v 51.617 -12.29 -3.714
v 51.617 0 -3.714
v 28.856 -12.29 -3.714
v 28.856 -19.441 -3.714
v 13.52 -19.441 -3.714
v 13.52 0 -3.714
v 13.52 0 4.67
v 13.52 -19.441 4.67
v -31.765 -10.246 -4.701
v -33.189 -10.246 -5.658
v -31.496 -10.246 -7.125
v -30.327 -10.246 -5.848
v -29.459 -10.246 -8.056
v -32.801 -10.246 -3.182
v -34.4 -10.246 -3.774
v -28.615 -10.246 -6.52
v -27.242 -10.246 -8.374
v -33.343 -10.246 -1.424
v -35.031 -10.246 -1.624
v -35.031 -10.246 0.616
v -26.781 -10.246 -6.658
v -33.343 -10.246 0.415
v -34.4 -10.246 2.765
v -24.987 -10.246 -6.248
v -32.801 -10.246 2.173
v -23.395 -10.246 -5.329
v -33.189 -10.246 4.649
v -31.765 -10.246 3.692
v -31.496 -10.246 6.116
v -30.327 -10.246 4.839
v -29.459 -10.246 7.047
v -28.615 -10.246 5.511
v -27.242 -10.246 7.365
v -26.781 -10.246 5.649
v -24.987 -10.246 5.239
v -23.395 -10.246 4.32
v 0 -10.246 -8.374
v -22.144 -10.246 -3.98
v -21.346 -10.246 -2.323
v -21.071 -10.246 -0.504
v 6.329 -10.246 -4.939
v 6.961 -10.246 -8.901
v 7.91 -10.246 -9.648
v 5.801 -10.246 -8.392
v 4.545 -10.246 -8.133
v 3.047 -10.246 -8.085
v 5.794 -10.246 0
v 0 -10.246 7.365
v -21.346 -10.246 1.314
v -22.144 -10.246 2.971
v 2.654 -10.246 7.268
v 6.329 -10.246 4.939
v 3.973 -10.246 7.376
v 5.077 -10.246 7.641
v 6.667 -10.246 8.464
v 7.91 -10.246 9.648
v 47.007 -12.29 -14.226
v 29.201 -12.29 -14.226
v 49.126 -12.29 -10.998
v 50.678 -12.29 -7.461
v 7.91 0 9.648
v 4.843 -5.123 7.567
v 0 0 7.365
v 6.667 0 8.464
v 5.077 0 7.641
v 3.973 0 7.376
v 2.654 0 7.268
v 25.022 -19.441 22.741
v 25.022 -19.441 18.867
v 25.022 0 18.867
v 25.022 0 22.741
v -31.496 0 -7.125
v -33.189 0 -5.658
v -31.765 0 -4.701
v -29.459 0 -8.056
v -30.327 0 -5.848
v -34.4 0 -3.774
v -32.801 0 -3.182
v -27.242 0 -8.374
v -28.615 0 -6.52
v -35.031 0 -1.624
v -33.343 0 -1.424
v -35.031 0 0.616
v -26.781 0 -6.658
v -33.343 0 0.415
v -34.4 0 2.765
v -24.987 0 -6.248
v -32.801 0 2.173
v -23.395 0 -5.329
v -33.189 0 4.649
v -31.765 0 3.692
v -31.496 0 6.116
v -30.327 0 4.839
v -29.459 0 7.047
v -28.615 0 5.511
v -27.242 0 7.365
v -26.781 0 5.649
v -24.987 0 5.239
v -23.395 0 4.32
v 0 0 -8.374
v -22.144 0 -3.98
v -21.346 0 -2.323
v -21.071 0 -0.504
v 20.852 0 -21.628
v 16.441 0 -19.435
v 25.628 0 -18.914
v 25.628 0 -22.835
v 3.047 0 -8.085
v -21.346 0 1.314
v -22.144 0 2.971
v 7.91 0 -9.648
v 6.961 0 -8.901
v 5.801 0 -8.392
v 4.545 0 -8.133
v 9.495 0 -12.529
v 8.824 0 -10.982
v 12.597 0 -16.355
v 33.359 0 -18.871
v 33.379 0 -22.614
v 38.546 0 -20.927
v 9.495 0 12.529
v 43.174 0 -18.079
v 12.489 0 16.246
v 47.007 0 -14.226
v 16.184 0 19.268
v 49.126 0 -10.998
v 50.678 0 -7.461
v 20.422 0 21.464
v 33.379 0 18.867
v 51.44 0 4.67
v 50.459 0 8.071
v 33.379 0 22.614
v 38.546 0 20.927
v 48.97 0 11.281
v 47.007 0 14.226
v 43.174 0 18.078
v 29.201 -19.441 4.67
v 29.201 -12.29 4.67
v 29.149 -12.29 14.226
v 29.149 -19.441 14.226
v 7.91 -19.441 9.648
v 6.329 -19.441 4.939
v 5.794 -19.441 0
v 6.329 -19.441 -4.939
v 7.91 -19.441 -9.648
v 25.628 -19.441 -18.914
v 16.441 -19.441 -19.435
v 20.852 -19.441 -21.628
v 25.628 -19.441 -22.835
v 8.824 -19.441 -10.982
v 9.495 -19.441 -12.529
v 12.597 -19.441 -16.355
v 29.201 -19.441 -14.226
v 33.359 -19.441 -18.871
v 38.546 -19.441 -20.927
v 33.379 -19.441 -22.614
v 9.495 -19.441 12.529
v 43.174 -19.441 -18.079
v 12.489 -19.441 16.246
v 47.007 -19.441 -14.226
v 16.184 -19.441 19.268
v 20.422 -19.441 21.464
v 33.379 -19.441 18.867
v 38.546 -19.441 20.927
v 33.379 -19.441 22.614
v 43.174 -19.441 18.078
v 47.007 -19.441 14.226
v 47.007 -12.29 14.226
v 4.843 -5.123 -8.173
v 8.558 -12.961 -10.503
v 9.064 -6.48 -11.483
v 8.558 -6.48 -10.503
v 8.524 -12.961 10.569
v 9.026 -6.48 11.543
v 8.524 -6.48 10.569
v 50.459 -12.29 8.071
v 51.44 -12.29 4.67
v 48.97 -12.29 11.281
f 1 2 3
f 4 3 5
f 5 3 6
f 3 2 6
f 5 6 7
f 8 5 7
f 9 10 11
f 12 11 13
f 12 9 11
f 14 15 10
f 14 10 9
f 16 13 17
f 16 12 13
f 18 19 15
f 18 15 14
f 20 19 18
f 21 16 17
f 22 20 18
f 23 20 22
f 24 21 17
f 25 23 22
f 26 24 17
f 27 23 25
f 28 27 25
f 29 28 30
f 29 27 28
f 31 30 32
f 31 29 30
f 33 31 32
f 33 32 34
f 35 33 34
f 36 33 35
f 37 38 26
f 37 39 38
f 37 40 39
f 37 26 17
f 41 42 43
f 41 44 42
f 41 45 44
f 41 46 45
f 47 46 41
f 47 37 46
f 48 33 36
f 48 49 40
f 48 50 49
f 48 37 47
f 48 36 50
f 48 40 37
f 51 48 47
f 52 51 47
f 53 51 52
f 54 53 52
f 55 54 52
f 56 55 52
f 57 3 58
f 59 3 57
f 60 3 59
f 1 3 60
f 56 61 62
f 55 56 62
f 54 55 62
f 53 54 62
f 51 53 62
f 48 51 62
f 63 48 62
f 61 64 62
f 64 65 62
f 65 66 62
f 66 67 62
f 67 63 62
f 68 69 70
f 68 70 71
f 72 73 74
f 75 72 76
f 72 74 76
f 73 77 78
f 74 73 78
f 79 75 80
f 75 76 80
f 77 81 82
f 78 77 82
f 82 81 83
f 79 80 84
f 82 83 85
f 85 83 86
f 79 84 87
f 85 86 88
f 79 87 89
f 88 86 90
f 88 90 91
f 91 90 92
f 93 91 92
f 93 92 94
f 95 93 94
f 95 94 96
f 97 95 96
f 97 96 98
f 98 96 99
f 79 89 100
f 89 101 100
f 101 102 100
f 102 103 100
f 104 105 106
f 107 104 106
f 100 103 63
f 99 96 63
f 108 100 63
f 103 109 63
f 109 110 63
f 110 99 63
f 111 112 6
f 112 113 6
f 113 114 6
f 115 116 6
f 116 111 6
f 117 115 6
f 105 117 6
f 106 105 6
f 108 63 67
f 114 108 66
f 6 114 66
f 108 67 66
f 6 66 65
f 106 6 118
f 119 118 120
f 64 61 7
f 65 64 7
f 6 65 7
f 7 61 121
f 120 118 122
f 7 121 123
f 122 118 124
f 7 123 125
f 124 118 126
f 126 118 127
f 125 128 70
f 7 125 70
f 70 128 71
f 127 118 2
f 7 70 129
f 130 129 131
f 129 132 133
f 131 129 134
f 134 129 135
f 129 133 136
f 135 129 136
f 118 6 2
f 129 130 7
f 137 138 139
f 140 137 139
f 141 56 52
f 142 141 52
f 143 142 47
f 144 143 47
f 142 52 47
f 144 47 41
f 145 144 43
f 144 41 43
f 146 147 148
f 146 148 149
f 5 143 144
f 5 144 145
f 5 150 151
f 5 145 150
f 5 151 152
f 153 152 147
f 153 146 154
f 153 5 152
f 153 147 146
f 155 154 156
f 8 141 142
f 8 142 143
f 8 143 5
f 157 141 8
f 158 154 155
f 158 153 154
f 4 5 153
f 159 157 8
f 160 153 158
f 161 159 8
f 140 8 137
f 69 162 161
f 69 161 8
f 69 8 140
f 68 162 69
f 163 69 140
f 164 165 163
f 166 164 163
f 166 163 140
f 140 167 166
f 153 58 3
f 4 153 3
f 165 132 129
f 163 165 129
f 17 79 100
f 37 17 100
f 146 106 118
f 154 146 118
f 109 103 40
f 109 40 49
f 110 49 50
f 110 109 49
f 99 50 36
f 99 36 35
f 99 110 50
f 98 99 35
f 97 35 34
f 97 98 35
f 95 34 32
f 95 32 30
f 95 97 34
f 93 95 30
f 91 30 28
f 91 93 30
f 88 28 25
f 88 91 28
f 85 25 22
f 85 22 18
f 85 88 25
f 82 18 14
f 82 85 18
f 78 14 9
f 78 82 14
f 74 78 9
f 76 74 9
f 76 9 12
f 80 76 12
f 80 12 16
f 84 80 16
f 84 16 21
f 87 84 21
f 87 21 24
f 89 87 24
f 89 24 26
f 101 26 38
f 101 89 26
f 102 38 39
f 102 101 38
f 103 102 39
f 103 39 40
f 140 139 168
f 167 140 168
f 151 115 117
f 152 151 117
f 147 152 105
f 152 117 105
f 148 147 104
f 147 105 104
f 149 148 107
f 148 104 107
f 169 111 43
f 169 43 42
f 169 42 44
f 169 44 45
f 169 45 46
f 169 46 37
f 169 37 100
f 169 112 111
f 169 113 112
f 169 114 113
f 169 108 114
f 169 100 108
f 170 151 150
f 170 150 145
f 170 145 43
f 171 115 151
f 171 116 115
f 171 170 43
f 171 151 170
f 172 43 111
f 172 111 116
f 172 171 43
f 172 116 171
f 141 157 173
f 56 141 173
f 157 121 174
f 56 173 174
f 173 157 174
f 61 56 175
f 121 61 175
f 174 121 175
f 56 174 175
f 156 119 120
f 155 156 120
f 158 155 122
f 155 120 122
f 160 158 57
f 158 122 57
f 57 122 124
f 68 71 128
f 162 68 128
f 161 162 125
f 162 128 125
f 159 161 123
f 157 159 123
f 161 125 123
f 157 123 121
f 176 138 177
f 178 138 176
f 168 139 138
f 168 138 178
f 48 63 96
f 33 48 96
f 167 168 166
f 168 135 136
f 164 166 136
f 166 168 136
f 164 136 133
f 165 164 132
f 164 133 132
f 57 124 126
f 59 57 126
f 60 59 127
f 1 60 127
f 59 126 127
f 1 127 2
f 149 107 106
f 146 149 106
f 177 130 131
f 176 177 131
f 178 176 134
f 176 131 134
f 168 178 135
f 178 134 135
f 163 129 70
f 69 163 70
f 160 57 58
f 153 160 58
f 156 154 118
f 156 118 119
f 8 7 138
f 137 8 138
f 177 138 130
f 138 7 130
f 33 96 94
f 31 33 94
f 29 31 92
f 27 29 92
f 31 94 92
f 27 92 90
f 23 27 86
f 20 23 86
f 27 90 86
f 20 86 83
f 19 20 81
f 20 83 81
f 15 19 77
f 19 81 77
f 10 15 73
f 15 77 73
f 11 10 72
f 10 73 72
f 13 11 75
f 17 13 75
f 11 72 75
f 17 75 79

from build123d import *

# Parameters (mm, degrees)
F0_R     = 6.1702881354
F1_DEPTH = 10.24551
F2_DEPTH = 19.44125
F3_DEPTH = 12.29025


# Not quite as in the source:
# - the program builds the solid bodies; features that only make, move or delete a surface that nothing else refers to are left out


with BuildPart() as f1:
    # F0 (on Front) → F1 (new body)
    with BuildSketch(Plane.XZ):
        with BuildLine():
            ThreePointArc((7.9096967883, -9.6482263274), (5.7944386046, 0), (7.9096967883, 9.6482263274))
            add(Edge.make_bspline(
                [(7.9096967883, 9.6482263274), (7.1691805882, 8.7133229845), (4.8849042306, 7.0496072248), (1.7047020698, 7.2518519174), (0, 7.3653594591)],
                knots=[0.305255717, 0.305255717, 0.305255717, 0.305255717, 0.6293542053, 1, 1, 1, 1], degree=3))
            Line((0, 7.3653594591), (-27.2417403758, 7.3653594591))
            ThreePointArc((-27.2417403758, 7.3653594591), (-35.1115765516, -0.5044767167), (-27.2417403758, -8.3743128926))
            Line((-27.2417403758, -8.3743128926), (0, -8.3743128926))
            add(Edge.make_bspline(
                [(7.9096967883, -9.6482263274), (7.1553998901, -8.8616436412), (4.7881379326, -7.7629787373), (1.6803783566, -8.1685536627), (0, -8.3743128926)],
                knots=[0.3094407552, 0.3094407552, 0.3094407552, 0.3094407552, 0.6242726729, 1, 1, 1, 1], degree=3))
        make_face()
        with Locations((-27.2417403758, -0.5044767167)):
            Circle(F0_R, mode=Mode.SUBTRACT)
    extrude(amount=F1_DEPTH)

    # F0 (on Front) → F2 (join)
    with BuildSketch(Plane.XZ):
        with BuildLine():
            Line((29.1485549066, 14.2256355643), (47.0073711523, 14.2256355643))
            ThreePointArc((47.0073711523, 14.2256355643), (40.9442597431, 19.6396071394), (33.3793842605, 22.6136728933))
            Line((33.3793842605, 22.6136728933), (33.3793842605, 18.8674259181))
            Line((33.3793842605, 18.8674259181), (25.0220429152, 18.8674259181))
            Line((25.0220429152, 18.8674259181), (25.0220429152, 22.7406880158))
            ThreePointArc((25.0220429152, 22.7406880158), (16.1840833933, 19.2680953065), (9.494543791, 12.5287712643))
            add(Edge.make_bspline(
                [(9.494543791, 12.5287712643), (9.0162268309, 11.5501776901), (8.6071600956, 10.5287752978), (7.9096967883, 9.6482263274)],
                knots=[0, 0, 0, 0, 0.305255717, 0.305255717, 0.305255717, 0.305255717], degree=3))
            ThreePointArc((7.9096967883, 9.6482263274), (5.7944386046, 0), (7.9096967883, -9.6482263274))
            add(Edge.make_bspline(
                [(9.494543791, -12.5287712643), (9.0785331078, -11.4704442228), (8.6510771527, -10.4213396199), (7.9096967883, -9.6482263274)],
                knots=[0, 0, 0, 0, 0.3094407552, 0.3094407552, 0.3094407552, 0.3094407552], degree=3))
            ThreePointArc((9.494543791, -12.5287712643), (16.441223865, -19.434771268), (25.6276700044, -22.8345370586))
            Line((25.6276700044, -22.8345370586), (25.6276700044, -18.9136881421))
            Line((25.6276700044, -18.9136881421), (33.3589574797, -18.8714867898))
            Line((33.3589574797, -18.8714867898), (33.3793842605, -22.6136728933))
            ThreePointArc((33.3793842605, -22.6136728933), (40.9439316742, -19.6398090623), (47.0068958817, -14.2262419686))
            Line((47.0068958817, -14.2262419686), (29.2007135878, -14.2262419686))
            Line((29.2007135878, -14.2262419686), (28.8560651243, -3.7142947274))
            Line((28.8560651243, -3.7142947274), (13.5199762881, -3.7142947274))
            Line((13.5199762881, -3.7142947274), (13.5199762881, 4.6701654948))
            Line((13.5199762881, 4.6701654948), (29.2007135878, 4.6701654948))
            Line((29.2007135878, 4.6701654948), (29.1485549066, 14.2256355643))
        make_face()
    extrude(amount=F2_DEPTH)

    # F0 (on Front) → F3 (join)
    with BuildSketch(Plane.XZ):
        with BuildLine():
            ThreePointArc((47.0068958817, -14.2262419686), (49.9762101479, -9.2616462852), (51.6166150388, -3.7142947274))
            Line((51.6166150388, -3.7142947274), (28.8560651243, -3.7142947274))
            Line((28.8560651243, -3.7142947274), (29.2007135878, -14.2262419686))
            Line((29.2007135878, -14.2262419686), (47.0068958817, -14.2262419686))
        make_face()
        with BuildLine():
            Line((29.2007135878, 4.6701654948), (51.4398684351, 4.6701654948))
            ThreePointArc((51.4398684351, 4.6701654948), (49.7764866132, 9.704358941), (47.0073711523, 14.2256355643))
            Line((47.0073711523, 14.2256355643), (29.1485549066, 14.2256355643))
            Line((29.1485549066, 14.2256355643), (29.2007135878, 4.6701654948))
        make_face()
    extrude(amount=F3_DEPTH)


solid = f1.part
